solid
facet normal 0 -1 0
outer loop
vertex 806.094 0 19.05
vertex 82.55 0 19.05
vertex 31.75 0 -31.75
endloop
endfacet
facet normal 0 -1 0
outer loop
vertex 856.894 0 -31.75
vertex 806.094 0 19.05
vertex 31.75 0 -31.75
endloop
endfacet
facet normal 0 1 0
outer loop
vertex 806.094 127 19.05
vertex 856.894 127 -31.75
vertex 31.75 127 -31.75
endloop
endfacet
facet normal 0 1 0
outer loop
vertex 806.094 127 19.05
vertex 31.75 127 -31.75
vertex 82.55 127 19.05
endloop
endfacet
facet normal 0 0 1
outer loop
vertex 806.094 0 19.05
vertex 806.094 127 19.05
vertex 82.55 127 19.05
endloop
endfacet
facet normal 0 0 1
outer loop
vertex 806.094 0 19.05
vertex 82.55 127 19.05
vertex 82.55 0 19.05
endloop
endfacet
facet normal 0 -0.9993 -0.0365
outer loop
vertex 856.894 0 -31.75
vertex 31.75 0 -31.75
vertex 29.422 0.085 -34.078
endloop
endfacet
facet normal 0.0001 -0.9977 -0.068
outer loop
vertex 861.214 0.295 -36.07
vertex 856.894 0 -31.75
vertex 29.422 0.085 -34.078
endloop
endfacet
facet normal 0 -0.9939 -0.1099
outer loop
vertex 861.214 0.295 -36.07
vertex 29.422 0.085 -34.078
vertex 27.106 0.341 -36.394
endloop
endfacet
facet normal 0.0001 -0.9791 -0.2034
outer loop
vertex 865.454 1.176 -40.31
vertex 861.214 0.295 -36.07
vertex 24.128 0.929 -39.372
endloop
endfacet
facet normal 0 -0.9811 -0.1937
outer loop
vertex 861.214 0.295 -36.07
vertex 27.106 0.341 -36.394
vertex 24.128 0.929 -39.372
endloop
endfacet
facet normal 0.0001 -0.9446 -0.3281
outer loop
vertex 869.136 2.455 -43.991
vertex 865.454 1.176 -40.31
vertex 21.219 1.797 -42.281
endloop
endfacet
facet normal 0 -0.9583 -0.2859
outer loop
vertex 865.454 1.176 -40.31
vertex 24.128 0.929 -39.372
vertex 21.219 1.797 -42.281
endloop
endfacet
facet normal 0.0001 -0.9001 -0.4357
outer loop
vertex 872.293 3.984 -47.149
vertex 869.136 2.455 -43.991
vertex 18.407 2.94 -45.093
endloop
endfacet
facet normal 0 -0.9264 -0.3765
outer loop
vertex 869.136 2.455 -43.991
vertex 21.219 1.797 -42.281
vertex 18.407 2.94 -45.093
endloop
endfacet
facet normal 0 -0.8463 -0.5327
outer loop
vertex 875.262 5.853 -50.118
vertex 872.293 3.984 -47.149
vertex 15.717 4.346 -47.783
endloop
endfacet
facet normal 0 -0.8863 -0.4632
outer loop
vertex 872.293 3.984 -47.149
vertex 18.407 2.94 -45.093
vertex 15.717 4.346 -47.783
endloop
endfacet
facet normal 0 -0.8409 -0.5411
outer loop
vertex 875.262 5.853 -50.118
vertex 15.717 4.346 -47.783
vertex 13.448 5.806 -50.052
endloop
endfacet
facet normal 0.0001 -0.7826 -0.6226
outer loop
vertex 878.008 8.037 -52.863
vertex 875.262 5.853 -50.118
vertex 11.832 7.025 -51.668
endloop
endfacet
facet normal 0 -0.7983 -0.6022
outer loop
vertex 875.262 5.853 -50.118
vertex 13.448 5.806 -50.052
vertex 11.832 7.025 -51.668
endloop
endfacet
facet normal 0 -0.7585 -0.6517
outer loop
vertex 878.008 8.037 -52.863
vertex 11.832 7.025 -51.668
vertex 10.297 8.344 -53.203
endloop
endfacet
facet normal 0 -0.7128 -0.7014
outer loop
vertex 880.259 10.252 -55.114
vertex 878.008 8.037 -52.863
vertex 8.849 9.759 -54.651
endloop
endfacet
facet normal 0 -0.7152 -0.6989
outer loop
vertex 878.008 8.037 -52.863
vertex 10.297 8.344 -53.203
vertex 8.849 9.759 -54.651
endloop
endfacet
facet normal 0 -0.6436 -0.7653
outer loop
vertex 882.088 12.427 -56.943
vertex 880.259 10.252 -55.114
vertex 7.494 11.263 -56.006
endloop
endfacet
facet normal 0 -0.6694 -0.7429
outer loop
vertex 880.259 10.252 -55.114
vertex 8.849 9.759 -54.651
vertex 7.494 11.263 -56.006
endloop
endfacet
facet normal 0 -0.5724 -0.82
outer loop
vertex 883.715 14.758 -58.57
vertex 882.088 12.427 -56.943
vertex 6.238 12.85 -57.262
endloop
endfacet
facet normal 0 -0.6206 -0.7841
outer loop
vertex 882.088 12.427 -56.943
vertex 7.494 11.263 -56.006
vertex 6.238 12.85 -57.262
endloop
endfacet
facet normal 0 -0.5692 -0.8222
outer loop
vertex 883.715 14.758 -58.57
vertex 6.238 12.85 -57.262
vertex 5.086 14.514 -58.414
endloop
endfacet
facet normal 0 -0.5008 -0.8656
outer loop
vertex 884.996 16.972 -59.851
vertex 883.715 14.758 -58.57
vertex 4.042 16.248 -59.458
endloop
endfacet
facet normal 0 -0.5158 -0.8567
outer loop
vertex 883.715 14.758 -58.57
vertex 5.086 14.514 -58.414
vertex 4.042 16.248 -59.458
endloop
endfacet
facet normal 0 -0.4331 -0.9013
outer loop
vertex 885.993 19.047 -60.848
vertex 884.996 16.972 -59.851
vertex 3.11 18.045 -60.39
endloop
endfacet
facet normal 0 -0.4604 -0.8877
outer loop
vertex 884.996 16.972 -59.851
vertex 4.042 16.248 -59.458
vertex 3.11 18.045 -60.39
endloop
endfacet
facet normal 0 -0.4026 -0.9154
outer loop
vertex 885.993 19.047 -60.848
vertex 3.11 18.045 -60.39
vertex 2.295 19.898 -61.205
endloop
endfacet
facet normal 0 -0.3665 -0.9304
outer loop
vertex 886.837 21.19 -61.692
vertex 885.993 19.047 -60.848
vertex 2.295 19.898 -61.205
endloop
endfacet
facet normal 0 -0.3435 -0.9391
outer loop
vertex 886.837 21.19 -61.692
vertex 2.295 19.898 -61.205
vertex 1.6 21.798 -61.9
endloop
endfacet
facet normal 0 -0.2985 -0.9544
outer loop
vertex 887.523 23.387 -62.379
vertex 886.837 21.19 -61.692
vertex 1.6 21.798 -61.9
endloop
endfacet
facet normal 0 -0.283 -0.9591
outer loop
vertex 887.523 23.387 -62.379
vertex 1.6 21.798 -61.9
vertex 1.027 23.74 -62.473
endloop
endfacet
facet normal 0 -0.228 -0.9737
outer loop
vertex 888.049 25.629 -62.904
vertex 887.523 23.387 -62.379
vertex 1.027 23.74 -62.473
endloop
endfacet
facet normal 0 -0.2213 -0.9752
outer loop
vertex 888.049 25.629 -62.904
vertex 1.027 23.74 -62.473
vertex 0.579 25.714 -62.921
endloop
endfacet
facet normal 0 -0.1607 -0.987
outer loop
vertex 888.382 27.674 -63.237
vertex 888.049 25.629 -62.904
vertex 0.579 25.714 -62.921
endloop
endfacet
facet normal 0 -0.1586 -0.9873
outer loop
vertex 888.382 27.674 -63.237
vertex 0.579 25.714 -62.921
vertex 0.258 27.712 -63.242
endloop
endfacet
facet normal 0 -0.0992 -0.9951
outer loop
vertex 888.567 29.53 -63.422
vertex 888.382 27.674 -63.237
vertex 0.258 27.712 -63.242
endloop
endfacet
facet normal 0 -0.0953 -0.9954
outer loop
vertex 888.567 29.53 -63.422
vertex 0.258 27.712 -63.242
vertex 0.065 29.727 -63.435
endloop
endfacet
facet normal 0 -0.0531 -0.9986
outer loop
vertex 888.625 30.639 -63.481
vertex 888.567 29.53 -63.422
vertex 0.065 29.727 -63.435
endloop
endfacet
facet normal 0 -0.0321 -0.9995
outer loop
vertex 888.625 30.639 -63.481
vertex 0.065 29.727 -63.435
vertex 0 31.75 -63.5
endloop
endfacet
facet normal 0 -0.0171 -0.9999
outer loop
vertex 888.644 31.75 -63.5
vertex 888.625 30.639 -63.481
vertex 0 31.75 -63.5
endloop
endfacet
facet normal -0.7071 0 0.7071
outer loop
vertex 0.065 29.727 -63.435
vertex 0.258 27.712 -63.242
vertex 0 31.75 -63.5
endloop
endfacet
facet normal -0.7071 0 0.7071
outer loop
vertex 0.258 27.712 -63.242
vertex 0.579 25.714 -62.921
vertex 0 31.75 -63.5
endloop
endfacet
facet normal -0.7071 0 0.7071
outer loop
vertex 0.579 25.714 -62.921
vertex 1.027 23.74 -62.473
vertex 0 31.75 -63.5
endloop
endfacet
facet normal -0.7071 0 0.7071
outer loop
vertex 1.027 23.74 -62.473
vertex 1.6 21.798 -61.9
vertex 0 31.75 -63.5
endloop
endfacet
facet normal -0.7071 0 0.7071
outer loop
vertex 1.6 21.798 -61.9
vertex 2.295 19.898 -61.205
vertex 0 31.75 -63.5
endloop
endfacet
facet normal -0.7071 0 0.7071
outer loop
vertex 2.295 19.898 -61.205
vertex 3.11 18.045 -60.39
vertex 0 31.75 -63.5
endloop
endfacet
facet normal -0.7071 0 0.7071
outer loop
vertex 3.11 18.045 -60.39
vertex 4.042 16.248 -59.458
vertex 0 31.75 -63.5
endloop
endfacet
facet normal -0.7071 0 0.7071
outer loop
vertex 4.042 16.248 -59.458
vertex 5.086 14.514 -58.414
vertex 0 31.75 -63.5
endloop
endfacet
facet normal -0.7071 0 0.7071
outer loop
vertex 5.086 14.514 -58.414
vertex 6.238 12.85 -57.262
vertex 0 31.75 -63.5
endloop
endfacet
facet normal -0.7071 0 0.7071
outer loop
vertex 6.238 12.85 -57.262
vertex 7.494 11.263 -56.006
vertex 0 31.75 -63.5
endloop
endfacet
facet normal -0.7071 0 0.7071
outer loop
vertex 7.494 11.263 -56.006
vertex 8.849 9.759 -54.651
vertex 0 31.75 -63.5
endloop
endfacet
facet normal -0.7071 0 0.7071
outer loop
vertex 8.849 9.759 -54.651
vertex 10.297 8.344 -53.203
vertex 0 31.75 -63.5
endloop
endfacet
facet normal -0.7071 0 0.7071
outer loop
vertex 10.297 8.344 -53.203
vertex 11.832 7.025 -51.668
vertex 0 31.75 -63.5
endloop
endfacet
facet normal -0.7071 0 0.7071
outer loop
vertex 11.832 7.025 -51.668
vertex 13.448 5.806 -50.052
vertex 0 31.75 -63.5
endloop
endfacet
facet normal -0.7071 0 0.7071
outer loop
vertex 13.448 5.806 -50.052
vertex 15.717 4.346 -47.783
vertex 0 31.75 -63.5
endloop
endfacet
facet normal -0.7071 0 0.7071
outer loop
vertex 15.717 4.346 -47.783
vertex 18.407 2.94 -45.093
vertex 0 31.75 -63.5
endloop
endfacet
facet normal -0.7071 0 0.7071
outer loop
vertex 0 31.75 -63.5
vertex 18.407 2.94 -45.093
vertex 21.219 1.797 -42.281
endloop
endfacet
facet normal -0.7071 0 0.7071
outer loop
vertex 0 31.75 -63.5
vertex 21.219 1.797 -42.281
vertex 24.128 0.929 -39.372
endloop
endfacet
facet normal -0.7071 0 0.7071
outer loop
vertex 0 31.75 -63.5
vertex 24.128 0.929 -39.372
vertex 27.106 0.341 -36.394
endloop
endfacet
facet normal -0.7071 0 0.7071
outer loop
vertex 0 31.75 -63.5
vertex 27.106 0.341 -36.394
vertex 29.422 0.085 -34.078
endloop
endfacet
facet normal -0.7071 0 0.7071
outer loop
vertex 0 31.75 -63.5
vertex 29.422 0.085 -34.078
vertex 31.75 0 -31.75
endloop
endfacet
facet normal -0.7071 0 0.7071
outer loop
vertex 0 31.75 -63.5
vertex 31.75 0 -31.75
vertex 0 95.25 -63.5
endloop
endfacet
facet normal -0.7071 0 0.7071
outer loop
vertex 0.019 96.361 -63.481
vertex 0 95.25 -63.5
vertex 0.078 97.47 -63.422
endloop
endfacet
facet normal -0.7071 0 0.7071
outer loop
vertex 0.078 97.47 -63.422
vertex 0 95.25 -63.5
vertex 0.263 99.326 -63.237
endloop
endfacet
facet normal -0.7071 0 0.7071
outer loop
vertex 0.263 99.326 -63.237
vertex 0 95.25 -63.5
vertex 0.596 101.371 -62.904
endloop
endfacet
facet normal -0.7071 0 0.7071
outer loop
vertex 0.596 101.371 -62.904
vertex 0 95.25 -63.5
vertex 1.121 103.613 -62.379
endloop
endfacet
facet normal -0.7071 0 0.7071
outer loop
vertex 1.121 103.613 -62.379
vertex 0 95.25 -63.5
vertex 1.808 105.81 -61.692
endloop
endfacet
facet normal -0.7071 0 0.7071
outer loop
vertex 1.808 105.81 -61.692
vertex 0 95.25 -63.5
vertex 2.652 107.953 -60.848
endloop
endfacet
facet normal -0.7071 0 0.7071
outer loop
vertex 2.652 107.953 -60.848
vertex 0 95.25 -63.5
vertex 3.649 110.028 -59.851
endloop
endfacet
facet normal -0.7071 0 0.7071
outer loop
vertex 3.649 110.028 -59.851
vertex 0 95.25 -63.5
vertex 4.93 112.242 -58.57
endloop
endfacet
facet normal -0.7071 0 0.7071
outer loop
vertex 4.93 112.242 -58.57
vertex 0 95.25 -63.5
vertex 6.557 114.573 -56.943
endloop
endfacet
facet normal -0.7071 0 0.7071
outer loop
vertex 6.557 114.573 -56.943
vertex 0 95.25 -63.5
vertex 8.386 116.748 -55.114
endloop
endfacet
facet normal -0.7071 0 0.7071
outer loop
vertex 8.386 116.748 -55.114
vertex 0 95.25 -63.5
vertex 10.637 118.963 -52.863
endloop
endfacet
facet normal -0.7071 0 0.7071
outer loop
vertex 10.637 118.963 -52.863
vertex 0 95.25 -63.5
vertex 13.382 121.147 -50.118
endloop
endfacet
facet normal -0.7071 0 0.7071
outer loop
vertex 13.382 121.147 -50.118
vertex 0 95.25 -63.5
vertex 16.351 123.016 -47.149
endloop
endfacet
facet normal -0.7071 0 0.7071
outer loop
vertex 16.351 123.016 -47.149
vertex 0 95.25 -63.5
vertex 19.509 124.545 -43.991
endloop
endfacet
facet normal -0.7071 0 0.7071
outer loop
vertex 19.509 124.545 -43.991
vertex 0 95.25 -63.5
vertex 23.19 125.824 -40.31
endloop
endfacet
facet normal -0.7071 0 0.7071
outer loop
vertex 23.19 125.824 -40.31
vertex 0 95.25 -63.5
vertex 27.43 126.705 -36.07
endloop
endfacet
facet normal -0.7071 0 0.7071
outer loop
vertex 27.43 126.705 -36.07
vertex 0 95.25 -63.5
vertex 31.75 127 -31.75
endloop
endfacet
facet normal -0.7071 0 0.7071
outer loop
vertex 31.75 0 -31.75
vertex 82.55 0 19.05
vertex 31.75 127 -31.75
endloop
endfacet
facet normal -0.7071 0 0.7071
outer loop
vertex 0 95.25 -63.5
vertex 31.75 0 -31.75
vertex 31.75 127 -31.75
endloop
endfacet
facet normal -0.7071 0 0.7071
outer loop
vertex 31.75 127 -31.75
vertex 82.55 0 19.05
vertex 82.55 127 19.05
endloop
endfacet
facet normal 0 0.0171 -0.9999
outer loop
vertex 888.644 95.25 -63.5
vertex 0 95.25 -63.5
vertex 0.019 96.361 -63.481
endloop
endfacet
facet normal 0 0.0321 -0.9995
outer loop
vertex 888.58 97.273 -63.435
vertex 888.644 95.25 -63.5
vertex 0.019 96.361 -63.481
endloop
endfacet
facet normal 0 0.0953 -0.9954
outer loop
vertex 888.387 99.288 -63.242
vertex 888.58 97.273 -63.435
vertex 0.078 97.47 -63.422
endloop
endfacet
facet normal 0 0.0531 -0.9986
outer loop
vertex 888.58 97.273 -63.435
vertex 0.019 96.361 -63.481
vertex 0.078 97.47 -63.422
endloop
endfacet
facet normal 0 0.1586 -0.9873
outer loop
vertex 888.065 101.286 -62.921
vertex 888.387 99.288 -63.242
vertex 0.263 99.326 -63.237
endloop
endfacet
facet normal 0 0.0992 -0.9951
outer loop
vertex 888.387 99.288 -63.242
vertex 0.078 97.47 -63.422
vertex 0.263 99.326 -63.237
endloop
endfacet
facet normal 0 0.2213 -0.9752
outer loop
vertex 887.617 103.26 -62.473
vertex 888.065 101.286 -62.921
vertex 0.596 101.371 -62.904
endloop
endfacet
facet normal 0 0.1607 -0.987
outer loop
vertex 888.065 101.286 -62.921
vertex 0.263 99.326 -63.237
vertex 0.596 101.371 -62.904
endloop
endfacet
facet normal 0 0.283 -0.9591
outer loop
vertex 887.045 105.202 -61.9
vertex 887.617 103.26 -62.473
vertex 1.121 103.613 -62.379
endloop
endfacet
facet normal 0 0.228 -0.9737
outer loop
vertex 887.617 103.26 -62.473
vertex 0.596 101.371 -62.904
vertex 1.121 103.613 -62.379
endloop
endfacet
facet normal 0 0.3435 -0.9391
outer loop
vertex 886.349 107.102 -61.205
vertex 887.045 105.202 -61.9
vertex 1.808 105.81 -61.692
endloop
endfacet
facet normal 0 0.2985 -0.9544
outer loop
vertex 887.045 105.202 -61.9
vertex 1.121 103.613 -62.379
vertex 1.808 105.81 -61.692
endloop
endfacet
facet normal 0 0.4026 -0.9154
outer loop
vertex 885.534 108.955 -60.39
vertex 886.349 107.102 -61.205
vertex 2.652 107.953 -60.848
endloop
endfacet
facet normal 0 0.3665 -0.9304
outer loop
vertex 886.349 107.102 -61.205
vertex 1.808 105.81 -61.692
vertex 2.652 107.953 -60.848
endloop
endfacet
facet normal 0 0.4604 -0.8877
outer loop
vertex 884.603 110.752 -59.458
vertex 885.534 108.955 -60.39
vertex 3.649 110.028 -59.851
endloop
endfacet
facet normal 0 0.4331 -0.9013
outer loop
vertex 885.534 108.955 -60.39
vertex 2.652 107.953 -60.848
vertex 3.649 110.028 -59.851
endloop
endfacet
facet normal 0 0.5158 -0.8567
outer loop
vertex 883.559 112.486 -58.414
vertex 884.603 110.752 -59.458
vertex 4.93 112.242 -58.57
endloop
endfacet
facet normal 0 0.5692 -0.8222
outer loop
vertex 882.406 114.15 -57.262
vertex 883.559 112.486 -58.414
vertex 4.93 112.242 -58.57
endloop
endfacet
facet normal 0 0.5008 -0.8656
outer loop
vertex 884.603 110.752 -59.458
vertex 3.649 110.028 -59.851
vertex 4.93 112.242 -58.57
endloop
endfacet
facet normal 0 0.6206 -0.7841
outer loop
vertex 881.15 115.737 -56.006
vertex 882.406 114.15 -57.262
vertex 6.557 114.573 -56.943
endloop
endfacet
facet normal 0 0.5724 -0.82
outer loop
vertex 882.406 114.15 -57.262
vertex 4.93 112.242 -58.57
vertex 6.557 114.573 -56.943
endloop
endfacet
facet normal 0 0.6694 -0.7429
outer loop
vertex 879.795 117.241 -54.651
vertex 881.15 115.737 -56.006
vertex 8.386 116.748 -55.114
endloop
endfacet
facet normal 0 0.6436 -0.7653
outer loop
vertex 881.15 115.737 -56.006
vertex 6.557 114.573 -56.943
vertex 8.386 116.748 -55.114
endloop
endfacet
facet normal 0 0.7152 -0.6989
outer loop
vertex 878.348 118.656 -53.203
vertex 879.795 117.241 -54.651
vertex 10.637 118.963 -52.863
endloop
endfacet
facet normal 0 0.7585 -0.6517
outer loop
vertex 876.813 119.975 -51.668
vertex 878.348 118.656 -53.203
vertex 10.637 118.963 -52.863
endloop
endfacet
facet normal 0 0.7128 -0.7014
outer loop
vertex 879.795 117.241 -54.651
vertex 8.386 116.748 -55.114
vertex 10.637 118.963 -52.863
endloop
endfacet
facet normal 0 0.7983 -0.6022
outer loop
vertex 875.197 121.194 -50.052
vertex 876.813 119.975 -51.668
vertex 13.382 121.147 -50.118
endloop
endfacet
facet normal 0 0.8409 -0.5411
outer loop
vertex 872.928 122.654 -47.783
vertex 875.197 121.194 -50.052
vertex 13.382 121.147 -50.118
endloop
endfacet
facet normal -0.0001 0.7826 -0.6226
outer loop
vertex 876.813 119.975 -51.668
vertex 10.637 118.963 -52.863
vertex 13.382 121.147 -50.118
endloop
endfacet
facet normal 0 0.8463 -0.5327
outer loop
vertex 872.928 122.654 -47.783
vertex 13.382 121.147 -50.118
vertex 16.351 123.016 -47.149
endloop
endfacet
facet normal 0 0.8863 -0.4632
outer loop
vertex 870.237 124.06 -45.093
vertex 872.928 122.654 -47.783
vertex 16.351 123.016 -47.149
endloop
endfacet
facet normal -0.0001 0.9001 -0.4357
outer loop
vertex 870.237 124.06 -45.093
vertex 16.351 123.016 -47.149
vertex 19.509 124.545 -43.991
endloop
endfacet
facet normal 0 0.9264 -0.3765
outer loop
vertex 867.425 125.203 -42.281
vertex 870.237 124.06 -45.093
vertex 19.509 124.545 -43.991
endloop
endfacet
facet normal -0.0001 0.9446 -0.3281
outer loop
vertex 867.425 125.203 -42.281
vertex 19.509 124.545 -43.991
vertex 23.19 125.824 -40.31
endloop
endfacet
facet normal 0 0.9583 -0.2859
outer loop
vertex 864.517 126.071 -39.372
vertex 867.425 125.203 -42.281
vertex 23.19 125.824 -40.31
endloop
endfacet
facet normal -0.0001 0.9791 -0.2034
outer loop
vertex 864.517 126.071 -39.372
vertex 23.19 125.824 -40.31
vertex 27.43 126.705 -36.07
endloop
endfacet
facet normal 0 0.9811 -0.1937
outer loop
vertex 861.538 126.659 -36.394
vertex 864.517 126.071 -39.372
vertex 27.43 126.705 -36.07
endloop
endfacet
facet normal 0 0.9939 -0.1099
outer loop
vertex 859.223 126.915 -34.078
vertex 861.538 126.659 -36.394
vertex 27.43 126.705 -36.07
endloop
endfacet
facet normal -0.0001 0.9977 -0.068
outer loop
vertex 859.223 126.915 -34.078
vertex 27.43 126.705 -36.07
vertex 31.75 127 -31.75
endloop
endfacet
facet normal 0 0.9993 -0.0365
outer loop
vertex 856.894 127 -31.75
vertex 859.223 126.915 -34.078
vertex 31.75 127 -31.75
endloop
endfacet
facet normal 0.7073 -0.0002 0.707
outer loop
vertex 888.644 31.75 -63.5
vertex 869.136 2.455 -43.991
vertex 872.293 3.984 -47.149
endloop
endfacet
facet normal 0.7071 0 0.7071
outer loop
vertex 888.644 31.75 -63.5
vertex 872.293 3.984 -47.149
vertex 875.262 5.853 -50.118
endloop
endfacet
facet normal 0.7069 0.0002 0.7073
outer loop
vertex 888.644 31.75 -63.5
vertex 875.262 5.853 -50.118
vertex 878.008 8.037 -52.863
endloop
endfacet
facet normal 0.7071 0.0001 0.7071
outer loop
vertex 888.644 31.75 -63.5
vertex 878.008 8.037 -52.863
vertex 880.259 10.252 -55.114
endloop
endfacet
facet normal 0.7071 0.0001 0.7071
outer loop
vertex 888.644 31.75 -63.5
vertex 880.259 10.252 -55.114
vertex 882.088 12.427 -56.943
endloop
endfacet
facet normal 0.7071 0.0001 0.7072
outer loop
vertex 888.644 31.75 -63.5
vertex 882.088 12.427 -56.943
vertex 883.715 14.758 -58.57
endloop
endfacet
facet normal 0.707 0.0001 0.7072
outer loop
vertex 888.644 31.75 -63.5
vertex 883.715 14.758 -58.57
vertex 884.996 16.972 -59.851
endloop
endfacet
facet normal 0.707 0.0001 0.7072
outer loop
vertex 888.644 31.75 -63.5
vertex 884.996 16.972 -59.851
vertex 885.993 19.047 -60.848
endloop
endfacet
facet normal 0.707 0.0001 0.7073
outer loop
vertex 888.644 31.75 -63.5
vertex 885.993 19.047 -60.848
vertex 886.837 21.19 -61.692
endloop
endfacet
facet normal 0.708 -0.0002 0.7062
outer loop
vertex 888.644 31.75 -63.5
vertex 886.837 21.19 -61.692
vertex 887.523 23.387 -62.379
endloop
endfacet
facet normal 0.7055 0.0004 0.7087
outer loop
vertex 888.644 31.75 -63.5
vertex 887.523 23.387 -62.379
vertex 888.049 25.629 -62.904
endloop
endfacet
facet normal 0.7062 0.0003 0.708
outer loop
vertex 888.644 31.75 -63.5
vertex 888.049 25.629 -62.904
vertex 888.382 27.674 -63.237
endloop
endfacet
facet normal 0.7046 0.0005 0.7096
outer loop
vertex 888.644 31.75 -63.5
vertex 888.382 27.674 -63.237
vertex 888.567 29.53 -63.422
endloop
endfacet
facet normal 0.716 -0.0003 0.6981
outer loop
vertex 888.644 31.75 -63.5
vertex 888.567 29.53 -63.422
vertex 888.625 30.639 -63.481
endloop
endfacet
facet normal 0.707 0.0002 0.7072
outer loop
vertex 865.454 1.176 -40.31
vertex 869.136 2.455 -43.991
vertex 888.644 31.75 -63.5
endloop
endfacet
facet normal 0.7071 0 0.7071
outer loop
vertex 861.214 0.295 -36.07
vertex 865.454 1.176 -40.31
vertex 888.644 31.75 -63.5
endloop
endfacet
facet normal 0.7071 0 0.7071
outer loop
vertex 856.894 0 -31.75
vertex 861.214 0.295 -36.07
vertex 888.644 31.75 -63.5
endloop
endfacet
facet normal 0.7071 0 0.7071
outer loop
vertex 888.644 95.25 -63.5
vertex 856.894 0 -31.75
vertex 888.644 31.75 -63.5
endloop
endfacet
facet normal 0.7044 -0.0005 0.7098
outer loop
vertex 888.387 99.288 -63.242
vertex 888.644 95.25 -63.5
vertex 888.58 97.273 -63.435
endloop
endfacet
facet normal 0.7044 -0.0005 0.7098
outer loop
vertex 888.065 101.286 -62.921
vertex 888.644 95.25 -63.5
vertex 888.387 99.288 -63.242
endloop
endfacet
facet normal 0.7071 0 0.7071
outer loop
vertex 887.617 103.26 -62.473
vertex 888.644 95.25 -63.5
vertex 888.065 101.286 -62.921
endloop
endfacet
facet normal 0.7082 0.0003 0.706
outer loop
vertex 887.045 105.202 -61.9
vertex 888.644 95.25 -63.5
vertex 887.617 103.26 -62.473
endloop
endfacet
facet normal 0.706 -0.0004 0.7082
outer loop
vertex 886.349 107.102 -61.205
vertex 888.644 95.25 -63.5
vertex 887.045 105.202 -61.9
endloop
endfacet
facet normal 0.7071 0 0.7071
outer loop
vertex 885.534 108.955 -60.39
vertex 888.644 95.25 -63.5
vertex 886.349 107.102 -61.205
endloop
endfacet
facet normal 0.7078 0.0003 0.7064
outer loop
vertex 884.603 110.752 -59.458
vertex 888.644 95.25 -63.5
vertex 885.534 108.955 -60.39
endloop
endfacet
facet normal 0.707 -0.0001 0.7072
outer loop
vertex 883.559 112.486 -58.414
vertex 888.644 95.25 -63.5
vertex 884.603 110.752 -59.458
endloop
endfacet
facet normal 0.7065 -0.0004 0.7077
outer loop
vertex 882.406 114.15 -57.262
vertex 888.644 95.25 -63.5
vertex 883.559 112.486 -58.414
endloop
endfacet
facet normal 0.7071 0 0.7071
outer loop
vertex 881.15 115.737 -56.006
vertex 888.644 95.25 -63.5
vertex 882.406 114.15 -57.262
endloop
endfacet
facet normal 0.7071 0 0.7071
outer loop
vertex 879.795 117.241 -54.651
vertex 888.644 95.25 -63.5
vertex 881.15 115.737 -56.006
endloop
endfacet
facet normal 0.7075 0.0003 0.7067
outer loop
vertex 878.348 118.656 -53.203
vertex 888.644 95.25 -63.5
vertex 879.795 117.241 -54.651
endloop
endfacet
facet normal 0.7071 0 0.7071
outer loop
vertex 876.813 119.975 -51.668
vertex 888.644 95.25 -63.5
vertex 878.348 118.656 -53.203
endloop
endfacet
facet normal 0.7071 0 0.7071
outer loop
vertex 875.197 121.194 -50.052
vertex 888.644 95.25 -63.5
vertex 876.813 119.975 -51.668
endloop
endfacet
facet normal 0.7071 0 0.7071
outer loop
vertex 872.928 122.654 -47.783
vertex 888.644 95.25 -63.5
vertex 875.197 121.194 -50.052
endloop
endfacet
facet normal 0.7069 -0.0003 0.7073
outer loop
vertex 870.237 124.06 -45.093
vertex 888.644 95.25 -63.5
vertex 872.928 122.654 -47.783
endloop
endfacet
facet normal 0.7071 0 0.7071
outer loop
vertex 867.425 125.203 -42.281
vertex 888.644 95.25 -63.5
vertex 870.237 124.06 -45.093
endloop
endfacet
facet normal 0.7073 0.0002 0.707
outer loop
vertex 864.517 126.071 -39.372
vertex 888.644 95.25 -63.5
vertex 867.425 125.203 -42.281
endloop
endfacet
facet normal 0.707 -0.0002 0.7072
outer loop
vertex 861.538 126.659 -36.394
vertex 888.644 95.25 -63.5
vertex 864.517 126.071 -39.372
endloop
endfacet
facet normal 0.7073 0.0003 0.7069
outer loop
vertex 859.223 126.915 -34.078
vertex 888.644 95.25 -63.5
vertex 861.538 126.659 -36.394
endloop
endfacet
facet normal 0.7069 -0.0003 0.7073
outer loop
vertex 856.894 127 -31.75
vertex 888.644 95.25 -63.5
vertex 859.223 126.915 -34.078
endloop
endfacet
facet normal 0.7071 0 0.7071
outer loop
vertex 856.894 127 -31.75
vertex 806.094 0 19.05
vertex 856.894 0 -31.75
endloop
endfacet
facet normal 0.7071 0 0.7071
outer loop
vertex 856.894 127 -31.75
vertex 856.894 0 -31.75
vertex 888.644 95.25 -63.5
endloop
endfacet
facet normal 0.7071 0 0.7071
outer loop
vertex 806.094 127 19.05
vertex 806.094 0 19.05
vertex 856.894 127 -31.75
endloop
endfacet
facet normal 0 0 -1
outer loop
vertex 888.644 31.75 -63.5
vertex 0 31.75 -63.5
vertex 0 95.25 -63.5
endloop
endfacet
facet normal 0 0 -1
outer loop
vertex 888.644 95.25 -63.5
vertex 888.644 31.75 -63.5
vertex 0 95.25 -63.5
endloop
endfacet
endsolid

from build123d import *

# Parameters (mm, degrees)
BOSS_EXTRUDE1_DEPTH = 888.6444
SKETCH2_W           = 344.402501539
SKETCH2_H           = 780.457540958
CUT_EXTRUDE1_DEPTH  = 59.371664787


with BuildPart() as part:
    # Sketch1 → Boss-Extrude1 (new body)
    with BuildSketch(Plane(origin=(0, 0, 0), x_dir=(0, 0, -1), z_dir=(1, 0, 0))):
        with BuildLine():
            Line((0, 0), (31.75, 0))
            ThreePointArc((31.75, 0), (54.200640303, 9.299359697), (63.5, 31.75))
            Line((63.5, 31.75), (63.5, 95.25))
            ThreePointArc((63.5, 95.25), (54.200640303, 117.700640303), (31.75, 127))
            Line((31.75, 127), (0, 127))
            Line((0, 127), (-19.05, 127))
            Line((-19.05, 127), (-19.05, 0))
            Line((-19.05, 0), (0, 0))
        make_face()
    extrude(amount=BOSS_EXTRUDE1_DEPTH)

    # Sketch2 → Cut-Extrude1 (cut, through all)
    with BuildSketch(Plane(origin=(412.5722, 0, 412.5722), x_dir=(0, 1, 0), z_dir=(0.707106781, 0, 0.707106781))):
        with Locations((32.995160032, -673.267761909)):
            Rectangle(SKETCH2_W, SKETCH2_H)
    cut_extrude1 = extrude(amount=CUT_EXTRUDE1_DEPTH, mode=Mode.SUBTRACT)

    # Mirror1: Cut-Extrude1 across plane
    add(cut_extrude1.mirror(Plane(origin=(444.3222, 0, 0), x_dir=(0, 0, 1), z_dir=(1, 0, 0))), mode=Mode.SUBTRACT)


solid = part.part
